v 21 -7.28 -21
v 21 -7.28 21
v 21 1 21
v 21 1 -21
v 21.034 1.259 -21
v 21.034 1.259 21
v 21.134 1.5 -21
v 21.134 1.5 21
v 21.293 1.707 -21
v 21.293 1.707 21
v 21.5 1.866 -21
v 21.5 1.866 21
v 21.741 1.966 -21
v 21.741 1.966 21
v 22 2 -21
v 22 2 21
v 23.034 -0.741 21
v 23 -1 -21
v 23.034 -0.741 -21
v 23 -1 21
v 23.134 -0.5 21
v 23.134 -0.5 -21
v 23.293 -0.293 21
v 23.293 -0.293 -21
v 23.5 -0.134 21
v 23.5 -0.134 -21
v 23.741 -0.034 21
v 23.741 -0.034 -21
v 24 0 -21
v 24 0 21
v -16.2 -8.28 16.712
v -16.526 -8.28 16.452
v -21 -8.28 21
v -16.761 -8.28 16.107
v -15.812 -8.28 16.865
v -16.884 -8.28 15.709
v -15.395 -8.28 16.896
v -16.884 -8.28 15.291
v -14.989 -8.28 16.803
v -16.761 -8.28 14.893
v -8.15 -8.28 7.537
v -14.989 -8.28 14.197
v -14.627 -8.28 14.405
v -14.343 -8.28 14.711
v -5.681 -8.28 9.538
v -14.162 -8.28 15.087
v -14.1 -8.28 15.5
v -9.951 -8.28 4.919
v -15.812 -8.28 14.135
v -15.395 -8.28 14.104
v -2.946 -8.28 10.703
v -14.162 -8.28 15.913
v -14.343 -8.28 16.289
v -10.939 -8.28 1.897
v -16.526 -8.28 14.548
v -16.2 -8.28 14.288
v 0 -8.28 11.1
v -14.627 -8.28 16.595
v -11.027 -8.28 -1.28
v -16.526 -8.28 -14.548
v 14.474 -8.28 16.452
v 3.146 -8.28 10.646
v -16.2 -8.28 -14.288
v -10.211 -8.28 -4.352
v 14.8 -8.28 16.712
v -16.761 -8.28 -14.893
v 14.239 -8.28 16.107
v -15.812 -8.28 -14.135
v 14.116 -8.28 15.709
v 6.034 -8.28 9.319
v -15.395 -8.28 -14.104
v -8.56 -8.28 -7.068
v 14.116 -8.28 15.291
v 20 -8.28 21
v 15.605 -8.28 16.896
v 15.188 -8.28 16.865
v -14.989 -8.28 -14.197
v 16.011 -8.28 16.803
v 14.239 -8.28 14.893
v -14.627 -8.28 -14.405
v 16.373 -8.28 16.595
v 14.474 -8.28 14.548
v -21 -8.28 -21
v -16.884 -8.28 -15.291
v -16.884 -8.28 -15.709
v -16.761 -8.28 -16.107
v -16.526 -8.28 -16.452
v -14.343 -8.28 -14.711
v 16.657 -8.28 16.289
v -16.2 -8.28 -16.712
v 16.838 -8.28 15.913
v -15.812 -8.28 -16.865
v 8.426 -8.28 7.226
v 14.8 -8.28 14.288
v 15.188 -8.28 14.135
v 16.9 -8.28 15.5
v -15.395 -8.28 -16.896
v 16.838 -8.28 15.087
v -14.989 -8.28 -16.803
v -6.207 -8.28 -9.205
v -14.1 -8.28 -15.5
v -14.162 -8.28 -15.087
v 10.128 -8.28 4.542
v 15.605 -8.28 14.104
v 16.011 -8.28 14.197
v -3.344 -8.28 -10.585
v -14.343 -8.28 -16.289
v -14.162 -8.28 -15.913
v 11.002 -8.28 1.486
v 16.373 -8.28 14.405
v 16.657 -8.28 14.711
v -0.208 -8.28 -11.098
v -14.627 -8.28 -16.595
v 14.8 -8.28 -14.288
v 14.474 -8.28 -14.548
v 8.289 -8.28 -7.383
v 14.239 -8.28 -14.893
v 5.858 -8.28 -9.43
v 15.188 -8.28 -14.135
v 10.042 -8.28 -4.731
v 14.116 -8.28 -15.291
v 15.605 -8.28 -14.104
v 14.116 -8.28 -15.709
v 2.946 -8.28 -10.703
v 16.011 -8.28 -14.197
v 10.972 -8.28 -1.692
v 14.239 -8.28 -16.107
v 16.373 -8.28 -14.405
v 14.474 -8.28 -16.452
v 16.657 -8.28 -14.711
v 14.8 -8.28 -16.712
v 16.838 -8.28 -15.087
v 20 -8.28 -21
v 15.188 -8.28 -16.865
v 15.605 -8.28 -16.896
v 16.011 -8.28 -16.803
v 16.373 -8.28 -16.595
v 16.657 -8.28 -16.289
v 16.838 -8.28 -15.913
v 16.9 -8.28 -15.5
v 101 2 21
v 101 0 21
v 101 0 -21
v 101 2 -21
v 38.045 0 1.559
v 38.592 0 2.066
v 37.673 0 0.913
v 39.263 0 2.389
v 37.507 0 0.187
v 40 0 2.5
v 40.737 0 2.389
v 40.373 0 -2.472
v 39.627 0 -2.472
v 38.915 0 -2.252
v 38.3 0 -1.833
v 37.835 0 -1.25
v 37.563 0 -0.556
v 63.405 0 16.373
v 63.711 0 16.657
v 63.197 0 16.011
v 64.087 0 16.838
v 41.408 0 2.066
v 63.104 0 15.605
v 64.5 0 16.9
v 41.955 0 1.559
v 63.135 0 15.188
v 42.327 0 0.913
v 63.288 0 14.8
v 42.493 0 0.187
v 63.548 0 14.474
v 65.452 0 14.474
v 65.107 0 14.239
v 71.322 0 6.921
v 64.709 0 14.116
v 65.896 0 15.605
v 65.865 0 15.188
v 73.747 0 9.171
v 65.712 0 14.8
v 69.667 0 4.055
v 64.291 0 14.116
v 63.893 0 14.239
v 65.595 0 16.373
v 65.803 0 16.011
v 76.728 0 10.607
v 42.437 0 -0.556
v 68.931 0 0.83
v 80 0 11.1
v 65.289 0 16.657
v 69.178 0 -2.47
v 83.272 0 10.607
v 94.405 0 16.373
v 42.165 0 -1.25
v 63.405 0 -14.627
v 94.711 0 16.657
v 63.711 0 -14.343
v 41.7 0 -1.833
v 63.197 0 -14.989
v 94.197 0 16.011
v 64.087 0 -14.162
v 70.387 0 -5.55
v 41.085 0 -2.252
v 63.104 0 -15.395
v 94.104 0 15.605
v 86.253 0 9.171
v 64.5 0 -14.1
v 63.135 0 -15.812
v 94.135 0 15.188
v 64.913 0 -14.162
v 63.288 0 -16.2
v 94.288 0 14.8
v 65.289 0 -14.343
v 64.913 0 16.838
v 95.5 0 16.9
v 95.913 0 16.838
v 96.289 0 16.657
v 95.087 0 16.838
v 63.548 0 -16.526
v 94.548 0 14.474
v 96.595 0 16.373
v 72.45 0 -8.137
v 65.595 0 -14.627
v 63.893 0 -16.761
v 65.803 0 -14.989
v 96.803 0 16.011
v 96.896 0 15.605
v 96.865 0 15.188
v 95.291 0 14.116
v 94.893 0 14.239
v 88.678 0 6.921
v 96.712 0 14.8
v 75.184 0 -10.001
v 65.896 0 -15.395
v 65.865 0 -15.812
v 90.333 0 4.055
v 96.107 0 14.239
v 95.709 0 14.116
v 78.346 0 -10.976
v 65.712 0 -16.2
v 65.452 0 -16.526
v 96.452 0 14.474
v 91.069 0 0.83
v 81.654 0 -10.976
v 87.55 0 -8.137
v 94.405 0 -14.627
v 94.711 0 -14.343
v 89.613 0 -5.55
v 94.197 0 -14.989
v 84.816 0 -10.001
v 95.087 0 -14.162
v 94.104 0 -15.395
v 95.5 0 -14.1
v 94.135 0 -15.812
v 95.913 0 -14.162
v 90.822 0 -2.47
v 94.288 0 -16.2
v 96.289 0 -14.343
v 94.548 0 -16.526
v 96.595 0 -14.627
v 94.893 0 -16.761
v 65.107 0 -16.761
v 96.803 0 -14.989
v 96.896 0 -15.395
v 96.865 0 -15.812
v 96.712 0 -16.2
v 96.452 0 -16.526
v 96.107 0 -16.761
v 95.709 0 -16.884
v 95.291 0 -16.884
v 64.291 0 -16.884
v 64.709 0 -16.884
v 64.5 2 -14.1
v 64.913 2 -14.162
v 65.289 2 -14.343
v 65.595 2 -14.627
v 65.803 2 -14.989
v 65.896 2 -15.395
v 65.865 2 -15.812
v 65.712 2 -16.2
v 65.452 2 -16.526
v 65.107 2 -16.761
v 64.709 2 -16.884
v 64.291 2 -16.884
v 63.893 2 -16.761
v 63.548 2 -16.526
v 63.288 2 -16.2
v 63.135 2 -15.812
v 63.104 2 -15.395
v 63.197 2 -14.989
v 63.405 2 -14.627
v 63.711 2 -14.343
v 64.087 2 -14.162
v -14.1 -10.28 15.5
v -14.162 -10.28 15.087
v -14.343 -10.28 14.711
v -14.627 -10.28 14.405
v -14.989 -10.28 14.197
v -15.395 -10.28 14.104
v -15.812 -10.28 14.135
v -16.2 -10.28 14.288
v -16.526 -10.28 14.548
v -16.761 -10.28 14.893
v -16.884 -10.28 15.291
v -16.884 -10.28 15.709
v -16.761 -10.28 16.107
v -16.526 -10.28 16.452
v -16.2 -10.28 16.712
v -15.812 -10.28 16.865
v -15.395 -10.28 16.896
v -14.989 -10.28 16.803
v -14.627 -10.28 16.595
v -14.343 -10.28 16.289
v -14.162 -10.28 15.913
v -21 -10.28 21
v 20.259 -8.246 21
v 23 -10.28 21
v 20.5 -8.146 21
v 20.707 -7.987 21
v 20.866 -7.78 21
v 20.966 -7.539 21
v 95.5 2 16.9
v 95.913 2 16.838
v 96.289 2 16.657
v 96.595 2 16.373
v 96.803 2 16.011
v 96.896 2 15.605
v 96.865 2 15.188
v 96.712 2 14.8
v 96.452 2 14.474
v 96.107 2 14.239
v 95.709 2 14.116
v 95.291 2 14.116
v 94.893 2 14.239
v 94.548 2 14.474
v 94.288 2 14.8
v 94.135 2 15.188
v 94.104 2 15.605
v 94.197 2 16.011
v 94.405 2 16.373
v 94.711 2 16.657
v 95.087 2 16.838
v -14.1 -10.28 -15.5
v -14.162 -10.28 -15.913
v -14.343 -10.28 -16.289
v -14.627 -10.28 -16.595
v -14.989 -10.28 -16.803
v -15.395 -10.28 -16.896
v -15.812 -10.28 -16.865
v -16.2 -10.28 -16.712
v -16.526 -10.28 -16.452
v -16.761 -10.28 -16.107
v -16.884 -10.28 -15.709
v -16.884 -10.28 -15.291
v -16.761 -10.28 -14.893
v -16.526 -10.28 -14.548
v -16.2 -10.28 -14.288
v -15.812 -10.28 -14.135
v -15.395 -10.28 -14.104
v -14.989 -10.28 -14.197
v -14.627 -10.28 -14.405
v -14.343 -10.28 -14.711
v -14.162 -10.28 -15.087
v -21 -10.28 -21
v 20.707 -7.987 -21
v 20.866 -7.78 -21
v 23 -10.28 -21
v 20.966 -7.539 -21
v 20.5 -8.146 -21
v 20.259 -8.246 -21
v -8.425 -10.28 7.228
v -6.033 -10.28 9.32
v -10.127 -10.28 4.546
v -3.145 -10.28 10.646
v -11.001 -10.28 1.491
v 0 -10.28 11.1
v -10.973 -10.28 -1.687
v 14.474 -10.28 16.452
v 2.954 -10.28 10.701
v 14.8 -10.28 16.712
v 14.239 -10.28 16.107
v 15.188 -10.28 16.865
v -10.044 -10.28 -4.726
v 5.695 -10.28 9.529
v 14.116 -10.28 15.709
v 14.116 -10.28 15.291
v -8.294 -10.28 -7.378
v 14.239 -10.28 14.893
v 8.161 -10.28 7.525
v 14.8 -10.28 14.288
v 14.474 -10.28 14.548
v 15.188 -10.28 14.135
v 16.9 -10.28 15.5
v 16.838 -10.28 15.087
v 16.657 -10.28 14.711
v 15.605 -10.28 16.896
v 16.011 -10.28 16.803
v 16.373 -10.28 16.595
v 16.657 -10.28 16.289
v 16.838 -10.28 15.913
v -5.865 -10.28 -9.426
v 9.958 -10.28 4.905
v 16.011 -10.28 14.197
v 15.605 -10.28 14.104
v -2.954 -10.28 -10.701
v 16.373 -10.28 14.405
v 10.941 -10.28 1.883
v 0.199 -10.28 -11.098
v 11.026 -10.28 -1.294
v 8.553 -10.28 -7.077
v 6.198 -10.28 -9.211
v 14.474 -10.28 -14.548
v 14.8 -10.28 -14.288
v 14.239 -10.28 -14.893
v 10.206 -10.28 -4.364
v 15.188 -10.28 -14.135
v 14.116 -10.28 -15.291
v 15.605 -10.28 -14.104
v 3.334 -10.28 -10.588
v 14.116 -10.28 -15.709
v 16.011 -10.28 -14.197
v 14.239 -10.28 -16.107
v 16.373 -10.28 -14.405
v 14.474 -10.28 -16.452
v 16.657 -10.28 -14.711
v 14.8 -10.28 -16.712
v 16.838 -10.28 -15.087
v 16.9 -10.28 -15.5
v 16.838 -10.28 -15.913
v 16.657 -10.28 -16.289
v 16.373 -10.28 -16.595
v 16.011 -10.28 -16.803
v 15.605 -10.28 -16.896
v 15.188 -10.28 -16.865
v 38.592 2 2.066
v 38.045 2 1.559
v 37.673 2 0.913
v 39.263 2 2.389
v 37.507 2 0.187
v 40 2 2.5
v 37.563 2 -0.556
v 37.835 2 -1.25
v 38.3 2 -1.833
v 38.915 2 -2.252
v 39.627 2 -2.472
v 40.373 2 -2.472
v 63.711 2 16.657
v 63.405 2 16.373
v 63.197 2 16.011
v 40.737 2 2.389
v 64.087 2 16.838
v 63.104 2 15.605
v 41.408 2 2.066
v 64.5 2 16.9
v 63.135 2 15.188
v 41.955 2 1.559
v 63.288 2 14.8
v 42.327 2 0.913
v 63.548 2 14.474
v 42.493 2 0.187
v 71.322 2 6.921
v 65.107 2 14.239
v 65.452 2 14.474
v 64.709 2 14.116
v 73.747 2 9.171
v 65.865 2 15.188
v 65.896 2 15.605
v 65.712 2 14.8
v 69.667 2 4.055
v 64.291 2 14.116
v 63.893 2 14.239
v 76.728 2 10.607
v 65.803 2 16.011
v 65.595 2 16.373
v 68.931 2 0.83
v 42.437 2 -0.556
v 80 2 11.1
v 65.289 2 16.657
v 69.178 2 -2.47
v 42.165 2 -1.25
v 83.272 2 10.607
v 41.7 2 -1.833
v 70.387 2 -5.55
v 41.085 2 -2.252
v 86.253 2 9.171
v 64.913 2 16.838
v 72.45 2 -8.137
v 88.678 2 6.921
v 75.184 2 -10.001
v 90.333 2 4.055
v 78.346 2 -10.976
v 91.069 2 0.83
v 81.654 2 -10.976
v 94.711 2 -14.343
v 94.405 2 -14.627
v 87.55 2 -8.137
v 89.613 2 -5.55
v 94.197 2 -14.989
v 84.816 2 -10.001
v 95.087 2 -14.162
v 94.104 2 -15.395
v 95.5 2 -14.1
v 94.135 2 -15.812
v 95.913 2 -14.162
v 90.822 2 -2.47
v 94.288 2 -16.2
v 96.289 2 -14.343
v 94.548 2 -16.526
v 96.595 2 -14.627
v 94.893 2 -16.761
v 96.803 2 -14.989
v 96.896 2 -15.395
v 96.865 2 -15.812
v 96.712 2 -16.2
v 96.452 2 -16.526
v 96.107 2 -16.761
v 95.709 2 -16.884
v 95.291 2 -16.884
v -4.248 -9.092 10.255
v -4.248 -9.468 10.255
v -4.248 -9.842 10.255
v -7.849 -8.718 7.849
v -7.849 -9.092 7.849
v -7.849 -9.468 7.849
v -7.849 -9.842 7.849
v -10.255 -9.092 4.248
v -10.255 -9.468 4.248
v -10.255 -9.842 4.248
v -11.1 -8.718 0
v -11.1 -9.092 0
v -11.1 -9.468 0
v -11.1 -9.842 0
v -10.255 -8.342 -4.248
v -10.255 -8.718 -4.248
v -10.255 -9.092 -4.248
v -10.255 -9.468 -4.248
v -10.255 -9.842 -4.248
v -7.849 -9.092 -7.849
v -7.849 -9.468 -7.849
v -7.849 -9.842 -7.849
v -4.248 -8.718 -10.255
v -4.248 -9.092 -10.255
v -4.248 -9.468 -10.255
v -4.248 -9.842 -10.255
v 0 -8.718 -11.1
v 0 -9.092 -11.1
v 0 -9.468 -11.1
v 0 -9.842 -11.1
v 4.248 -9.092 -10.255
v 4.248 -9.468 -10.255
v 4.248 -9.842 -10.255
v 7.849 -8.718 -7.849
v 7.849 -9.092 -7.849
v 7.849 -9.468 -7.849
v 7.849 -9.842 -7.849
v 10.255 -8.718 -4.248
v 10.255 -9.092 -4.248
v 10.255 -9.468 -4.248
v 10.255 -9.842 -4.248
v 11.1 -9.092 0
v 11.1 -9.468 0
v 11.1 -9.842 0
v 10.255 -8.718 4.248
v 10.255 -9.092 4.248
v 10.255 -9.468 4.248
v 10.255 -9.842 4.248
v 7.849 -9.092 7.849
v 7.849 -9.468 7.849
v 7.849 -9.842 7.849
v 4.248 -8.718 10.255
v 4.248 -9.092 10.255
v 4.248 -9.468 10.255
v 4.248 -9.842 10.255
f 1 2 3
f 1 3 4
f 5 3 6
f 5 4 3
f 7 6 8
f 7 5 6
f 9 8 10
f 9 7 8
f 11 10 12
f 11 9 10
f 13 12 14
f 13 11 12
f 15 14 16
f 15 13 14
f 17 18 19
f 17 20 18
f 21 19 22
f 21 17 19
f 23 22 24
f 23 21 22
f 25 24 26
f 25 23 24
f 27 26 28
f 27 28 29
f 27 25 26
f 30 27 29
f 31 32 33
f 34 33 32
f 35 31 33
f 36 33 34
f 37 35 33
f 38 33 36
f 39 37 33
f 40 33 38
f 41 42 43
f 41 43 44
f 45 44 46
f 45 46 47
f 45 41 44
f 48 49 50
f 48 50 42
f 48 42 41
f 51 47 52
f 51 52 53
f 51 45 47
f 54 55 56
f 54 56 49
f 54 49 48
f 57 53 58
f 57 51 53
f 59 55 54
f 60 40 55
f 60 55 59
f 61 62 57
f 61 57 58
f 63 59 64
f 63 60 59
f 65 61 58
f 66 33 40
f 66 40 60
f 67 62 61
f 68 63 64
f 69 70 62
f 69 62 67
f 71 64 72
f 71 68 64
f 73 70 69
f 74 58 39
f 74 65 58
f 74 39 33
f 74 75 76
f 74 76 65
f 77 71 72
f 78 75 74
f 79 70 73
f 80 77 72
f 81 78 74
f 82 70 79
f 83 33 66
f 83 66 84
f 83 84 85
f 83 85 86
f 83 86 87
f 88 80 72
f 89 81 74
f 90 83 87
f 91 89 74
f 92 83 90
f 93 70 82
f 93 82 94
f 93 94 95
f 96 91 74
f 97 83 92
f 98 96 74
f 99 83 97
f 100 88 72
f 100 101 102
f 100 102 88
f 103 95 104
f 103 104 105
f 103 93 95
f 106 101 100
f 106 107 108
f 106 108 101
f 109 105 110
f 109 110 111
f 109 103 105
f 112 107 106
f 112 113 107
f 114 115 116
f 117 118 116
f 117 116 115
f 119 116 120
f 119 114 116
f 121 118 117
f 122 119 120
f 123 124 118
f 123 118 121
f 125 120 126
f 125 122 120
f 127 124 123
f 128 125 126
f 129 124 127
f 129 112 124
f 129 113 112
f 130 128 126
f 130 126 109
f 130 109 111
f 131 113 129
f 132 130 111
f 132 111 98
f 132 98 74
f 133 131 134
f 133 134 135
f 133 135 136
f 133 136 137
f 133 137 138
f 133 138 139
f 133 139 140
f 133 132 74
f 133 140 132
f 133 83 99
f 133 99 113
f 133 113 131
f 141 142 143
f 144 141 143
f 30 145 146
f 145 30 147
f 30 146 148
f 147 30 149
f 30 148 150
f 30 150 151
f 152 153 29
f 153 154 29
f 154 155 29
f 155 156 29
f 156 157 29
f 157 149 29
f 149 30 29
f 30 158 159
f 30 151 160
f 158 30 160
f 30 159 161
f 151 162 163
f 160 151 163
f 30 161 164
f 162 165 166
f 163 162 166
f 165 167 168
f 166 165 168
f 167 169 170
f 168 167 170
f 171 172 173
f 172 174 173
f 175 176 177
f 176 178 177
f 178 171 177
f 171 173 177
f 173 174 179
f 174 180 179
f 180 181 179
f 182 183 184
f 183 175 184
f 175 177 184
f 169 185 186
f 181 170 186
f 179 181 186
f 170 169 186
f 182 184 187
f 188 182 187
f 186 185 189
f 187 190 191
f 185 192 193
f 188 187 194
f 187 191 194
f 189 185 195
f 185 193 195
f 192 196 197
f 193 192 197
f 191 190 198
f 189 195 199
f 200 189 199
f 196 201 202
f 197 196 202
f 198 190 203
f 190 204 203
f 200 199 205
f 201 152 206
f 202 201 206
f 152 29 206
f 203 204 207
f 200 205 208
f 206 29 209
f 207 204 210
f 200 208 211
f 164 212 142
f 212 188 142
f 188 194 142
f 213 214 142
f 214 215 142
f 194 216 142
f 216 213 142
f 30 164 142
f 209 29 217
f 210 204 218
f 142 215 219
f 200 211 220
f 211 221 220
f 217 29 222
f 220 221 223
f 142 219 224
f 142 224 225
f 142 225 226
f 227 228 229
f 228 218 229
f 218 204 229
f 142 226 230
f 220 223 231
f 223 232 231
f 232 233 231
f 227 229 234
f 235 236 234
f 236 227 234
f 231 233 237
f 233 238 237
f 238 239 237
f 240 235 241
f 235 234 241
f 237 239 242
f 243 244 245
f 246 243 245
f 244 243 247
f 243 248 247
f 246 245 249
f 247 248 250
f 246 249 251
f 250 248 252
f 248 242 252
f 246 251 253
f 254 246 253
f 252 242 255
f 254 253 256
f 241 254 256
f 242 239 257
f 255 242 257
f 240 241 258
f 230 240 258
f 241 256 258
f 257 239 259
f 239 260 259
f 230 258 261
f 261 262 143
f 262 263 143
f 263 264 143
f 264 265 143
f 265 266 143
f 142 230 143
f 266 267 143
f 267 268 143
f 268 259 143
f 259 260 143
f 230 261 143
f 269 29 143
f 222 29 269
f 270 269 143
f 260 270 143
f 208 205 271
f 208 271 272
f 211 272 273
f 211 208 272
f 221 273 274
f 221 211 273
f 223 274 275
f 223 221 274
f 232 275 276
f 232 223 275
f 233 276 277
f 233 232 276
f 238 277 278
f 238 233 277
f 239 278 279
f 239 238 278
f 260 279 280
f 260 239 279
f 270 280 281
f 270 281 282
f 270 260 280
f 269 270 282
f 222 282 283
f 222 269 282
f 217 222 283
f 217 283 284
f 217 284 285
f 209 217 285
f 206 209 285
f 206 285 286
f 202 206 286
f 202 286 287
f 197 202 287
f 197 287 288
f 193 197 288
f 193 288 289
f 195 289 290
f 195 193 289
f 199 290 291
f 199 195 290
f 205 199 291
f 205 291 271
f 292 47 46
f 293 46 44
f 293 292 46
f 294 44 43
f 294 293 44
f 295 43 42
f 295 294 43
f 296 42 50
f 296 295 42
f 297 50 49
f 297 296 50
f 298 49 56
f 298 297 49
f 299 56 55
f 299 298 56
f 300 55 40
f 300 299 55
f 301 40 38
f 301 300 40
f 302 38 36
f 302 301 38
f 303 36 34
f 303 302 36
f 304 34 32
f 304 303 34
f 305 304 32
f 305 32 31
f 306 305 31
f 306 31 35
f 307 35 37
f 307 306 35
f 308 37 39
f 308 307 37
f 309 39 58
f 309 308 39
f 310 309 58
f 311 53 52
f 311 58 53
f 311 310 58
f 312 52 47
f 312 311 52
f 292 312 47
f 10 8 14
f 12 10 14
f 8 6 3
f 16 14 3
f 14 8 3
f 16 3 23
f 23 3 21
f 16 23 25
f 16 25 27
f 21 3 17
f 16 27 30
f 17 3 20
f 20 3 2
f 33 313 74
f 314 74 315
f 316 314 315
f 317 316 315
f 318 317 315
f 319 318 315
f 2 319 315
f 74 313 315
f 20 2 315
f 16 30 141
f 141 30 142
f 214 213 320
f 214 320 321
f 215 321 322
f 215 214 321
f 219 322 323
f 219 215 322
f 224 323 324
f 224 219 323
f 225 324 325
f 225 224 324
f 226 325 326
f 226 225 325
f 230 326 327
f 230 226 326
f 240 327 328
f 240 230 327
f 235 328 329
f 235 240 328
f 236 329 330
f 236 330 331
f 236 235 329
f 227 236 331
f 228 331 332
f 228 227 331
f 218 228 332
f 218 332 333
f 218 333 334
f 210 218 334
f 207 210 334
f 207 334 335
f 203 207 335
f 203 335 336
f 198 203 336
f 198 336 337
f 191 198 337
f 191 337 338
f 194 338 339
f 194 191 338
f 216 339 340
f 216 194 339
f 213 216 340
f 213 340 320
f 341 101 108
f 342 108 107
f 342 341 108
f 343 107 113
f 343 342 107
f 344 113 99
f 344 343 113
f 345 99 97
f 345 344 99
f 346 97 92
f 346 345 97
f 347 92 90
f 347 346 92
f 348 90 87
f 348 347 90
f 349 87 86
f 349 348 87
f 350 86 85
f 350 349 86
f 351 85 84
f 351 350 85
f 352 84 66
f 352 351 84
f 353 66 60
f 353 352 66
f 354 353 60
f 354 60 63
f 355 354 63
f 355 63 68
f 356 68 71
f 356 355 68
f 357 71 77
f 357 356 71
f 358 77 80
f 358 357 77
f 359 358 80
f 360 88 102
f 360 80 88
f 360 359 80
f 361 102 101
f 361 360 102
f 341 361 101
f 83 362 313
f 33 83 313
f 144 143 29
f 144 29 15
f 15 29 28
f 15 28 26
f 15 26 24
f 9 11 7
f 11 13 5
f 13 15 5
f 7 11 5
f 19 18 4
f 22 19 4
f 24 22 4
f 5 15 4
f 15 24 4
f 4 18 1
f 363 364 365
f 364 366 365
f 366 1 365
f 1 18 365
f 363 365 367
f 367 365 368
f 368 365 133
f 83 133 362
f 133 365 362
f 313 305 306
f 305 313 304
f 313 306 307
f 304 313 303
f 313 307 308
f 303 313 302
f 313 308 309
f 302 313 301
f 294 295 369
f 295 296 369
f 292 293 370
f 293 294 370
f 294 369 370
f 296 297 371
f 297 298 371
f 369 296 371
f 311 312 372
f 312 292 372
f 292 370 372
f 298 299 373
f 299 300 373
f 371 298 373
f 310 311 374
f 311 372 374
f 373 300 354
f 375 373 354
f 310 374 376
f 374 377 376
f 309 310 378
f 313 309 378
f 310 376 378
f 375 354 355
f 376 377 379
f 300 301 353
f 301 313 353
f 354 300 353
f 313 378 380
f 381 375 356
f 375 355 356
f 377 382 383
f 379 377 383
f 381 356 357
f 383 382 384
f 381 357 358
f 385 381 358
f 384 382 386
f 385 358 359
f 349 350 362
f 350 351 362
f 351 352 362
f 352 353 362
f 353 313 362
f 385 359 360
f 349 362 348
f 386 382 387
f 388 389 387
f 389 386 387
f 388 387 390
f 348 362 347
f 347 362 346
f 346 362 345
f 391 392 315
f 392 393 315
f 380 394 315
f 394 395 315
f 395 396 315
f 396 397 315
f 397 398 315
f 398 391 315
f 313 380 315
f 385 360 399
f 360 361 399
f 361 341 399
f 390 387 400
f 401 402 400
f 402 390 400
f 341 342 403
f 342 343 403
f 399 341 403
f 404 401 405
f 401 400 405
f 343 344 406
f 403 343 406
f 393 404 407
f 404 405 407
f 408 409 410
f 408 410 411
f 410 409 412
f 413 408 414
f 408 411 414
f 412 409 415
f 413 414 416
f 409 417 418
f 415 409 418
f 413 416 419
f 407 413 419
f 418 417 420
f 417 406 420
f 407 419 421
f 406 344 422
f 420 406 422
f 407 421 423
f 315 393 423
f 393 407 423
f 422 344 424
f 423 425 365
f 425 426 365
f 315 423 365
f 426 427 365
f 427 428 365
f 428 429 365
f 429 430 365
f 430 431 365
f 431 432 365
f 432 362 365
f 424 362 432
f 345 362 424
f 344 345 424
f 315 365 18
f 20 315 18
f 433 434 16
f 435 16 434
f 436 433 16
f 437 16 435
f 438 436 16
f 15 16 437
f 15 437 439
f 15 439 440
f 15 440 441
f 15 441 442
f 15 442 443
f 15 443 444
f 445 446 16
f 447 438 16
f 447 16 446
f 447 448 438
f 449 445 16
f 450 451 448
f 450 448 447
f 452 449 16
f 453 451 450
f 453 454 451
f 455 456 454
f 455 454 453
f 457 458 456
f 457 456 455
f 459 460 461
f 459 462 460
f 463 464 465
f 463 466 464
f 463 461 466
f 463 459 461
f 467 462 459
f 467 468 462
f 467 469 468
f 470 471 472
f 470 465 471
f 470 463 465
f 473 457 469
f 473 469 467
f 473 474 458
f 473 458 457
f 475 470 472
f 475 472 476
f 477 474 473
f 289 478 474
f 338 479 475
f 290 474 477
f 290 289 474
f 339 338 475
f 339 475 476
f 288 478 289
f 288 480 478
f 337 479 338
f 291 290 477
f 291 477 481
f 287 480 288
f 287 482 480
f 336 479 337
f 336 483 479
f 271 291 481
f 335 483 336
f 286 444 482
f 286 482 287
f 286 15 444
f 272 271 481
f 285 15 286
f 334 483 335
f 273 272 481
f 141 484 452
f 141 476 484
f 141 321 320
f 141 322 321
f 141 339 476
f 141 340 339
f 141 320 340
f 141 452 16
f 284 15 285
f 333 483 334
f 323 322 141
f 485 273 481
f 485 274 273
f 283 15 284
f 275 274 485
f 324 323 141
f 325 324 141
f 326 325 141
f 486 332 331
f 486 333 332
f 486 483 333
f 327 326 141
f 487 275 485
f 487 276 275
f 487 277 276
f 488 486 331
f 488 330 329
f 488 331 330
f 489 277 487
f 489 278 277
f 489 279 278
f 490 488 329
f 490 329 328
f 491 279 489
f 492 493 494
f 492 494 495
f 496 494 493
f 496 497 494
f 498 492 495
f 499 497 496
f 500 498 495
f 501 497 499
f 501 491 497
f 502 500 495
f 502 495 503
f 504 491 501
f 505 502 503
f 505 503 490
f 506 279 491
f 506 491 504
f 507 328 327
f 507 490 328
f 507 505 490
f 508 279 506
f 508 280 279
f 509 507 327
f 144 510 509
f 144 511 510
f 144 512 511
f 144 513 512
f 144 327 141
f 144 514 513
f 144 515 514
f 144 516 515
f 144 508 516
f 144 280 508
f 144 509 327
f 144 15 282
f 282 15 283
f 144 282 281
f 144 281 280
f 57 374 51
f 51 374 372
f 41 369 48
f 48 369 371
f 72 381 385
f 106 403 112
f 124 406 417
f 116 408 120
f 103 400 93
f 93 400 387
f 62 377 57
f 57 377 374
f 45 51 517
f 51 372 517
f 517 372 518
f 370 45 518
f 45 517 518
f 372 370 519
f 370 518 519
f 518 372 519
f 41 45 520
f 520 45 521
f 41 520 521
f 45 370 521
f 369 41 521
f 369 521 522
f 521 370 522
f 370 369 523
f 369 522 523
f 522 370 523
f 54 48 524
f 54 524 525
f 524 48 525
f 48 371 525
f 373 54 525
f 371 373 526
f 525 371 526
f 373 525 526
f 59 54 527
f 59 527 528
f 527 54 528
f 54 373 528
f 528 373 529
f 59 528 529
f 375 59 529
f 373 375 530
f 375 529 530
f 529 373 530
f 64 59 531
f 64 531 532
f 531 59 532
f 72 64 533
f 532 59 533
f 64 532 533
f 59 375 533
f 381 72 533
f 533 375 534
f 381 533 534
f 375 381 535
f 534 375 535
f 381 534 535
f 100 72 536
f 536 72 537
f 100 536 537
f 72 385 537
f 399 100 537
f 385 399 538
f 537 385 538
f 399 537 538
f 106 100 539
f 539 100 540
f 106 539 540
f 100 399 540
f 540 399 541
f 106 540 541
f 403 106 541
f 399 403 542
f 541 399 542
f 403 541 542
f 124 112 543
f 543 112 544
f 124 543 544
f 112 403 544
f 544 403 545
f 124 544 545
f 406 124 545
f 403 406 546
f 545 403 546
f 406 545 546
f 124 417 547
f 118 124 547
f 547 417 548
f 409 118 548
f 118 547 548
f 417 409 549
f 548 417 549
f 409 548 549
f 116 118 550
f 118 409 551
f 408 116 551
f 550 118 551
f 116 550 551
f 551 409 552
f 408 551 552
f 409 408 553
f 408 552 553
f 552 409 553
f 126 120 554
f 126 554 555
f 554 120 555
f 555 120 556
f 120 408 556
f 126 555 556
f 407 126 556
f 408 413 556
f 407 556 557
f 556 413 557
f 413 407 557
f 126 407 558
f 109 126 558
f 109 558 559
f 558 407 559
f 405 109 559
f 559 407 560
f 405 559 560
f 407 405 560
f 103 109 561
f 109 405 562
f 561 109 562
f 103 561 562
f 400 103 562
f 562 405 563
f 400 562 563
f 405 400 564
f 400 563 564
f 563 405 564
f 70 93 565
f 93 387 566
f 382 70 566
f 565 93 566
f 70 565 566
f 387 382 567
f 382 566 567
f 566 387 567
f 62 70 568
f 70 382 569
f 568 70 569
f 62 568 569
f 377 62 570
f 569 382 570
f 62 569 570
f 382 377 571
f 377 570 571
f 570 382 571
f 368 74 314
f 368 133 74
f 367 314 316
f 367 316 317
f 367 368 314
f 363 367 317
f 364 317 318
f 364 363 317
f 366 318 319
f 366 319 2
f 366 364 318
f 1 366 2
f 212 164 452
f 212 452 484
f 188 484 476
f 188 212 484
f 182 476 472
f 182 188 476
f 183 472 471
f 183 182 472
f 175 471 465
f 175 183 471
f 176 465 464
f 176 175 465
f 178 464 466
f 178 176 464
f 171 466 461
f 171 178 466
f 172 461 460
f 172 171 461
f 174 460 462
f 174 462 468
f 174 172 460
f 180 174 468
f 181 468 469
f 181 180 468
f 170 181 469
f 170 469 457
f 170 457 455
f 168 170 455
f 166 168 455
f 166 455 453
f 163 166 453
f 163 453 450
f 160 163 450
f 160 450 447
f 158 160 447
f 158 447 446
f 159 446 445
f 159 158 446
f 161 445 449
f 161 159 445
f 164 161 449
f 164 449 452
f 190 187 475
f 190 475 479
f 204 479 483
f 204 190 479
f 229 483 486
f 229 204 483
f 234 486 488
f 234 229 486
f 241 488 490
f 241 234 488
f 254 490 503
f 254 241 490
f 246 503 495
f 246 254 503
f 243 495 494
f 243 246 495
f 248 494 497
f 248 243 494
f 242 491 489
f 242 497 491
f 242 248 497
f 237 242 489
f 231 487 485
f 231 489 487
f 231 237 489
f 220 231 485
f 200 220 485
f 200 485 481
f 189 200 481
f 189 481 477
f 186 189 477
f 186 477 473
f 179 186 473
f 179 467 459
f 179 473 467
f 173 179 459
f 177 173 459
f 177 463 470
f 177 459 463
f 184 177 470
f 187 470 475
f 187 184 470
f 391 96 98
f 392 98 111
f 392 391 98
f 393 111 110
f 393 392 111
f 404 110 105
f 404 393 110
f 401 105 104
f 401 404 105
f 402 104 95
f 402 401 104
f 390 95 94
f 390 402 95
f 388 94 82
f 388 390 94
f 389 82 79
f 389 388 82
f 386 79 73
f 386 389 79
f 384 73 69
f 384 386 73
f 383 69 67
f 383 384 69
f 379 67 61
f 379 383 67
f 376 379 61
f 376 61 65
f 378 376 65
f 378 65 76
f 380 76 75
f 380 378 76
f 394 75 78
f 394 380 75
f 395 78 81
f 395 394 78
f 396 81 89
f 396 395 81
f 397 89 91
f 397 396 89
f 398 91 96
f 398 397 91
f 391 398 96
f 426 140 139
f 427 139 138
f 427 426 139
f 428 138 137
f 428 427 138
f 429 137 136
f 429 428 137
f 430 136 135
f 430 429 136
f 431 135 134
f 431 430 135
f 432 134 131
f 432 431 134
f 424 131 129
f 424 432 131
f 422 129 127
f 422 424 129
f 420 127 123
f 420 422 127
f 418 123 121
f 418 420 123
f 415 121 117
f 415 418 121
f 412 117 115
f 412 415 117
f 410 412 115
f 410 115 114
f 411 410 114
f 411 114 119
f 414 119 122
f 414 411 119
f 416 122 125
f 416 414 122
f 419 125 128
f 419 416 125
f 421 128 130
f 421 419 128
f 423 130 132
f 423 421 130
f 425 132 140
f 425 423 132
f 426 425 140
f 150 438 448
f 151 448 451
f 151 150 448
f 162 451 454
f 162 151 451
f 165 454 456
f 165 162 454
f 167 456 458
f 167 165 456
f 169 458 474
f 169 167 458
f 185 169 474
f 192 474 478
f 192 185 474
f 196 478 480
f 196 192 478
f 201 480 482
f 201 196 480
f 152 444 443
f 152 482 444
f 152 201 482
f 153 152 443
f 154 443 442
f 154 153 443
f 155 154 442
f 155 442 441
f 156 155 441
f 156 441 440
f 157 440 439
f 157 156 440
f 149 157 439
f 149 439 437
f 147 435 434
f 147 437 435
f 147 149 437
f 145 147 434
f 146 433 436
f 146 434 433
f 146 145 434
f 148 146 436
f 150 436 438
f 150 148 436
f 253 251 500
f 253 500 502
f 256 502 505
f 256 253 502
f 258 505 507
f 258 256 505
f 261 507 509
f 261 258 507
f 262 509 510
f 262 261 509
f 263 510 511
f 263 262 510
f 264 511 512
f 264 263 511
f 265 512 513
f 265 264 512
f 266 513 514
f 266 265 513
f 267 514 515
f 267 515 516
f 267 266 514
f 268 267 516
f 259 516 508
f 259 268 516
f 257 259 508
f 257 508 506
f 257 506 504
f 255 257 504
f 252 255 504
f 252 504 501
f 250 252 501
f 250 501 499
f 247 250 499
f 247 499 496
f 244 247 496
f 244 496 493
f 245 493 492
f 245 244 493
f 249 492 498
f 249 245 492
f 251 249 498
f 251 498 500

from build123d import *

# Parameters (mm, degrees)
SKETCH1_W               = 38
SKETCH1_H               = 21
SKETCH1_R               = 1.4
BOSS_EXTRUDE1_DEPTH     = 2
CUT_EXTRUDE1_DEPTH      = 104.179455
CUT_EXTRUDE1_DEPTH_BACK = 104.179455
SKETCH3_R               = 11.1
CUT_EXTRUDE2_DEPTH      = 104.179455
CUT_EXTRUDE2_DEPTH_BACK = 104.179455
SKETCH4_R               = 2.5
BOSS_EXTRUDE2_START     = -12.28
BOSS_EXTRUDE2_OUTLINE_R = 1.4
BOSS_EXTRUDE2_DEPTH     = 10.28
CUT_EXTRUDE3_START      = -10.28
SKETCH6_W               = 42
SKETCH6_H               = 42
SKETCH6_R               = 1.4
CUT_EXTRUDE3_DEPTH      = 10.28
CUT_EXTRUDE4_DEPTH      = 110.866639
CUT_EXTRUDE4_DEPTH_BACK = 110.866639
SKETCH7_W               = 17
SKETCH7_H               = 10.28
FILLET1_R               = 1


# Read off the part's stored shape, not the designer's step: Boss-Extrude2
with BuildPart() as part:
    # Sketch1 → Boss-Extrude1 (new body)
    # profile 1 of 4: a face of its own
    with BuildSketch(Plane(origin=(0, 0, 0), x_dir=(1, 0, 0), z_dir=(0, 1, 0))):
        with Locations((40, 10.5)):
            Rectangle(SKETCH1_W, SKETCH1_H)
    # profile 2 of 4: a face of its own
    with BuildSketch(Plane(origin=(0, 0, 0), x_dir=(1, 0, 0), z_dir=(0, 1, 0))):
        Polygon((21, -21), (21, 0), (21, 21), (-21, 21), (-21, -21), align=None)
        with Locations(Location((-15.5, -15.5, 0), (0, 0, 270))):
            Circle(SKETCH1_R, mode=Mode.SUBTRACT)
        with Locations(Location((15.5, -15.5, 0), (0, 0, 270))):
            Circle(SKETCH1_R, mode=Mode.SUBTRACT)
        with Locations(Location((-15.5, 15.5, 0), (0, 0, 270))):
            Circle(SKETCH1_R, mode=Mode.SUBTRACT)
        with Locations(Location((15.5, 15.5, 0), (0, 0, 270))):
            Circle(SKETCH1_R, mode=Mode.SUBTRACT)
    # profile 3 of 4: a face of its own
    with BuildSketch(Plane(origin=(0, 0, 0), x_dir=(1, 0, 0), z_dir=(0, 1, 0))):
        with Locations((40, -10.5)):
            Rectangle(SKETCH1_W, SKETCH1_H)
    # profile 4 of 4: a face of its own
    with BuildSketch(Plane(origin=(0, 0, 0), x_dir=(1, 0, 0), z_dir=(0, 1, 0))):
        Polygon((59, 21), (59, 0), (59, -21), (101, -21), (101, 21), align=None)
        with Locations(Location((64.5, -15.5, 0), (0, 0, 270))):
            Circle(SKETCH1_R, mode=Mode.SUBTRACT)
        with Locations(Location((95.5, -15.5, 0), (0, 0, 270))):
            Circle(SKETCH1_R, mode=Mode.SUBTRACT)
        with Locations(Location((64.5, 15.5, 0), (0, 0, 270))):
            Circle(SKETCH1_R, mode=Mode.SUBTRACT)
        with Locations(Location((95.5, 15.5, 0), (0, 0, 270))):
            Circle(SKETCH1_R, mode=Mode.SUBTRACT)
    extrude(amount=BOSS_EXTRUDE1_DEPTH)

    # Sketch3 → Cut-Extrude1 (cut, two sides: drawn at the far end of the back side and taken through both)
    with BuildSketch(Plane(origin=(0, 2, 0), x_dir=(1, 0, 0), z_dir=(0, 1, 0)).offset(-CUT_EXTRUDE1_DEPTH_BACK)):
        with Locations(Location((80, 0, 0), (0, 0, 270))):
            Circle(SKETCH3_R)
        with Locations(Location((0, 0, 0), (0, 0, 270))):
            Circle(SKETCH3_R)
    extrude(amount=CUT_EXTRUDE1_DEPTH + CUT_EXTRUDE1_DEPTH_BACK, mode=Mode.SUBTRACT)

    # Sketch4 → Cut-Extrude2 (cut, two sides: drawn at the far end of the back side and taken through both)
    with BuildSketch(Plane(origin=(0, 2, 0), x_dir=(1, 0, 0), z_dir=(0, 1, 0)).offset(-CUT_EXTRUDE2_DEPTH_BACK)):
        with Locations(Location((40, 0, 0), (0, 0, 270))):
            Circle(SKETCH4_R)
    extrude(amount=CUT_EXTRUDE2_DEPTH + CUT_EXTRUDE2_DEPTH_BACK, mode=Mode.SUBTRACT)


with BuildPart() as boss_extrude2_tool:
    # Boss-Extrude2 outline → Boss-Extrude2 (new body)
    with BuildSketch(Plane(origin=(0, 2, 0), x_dir=(1, 0, 0), z_dir=(0, 1, 0)).offset(BOSS_EXTRUDE2_START)):
        with BuildLine():
            Line((-21, -21), (40, -21))
            Line((40, -21), (40, -2.5))
            ThreePointArc((40, -2.5), (37.5, 0), (40, 2.5))
            Line((40, 2.5), (40, 21))
            Line((40, 21), (-21, 21))
            Line((-21, 21), (-21, -21))
        make_face()
        with Locations((-15.5, -15.5)):
            Circle(BOSS_EXTRUDE2_OUTLINE_R, mode=Mode.SUBTRACT)
        with Locations((15.5, -15.5)):
            Circle(BOSS_EXTRUDE2_OUTLINE_R, mode=Mode.SUBTRACT)
        with BuildLine():
            add(Edge.make_bspline(
                [(0, -11.1), (-0.726845, -11.100027), (-2.180374, -10.961006), (-4.27463, -10.319187), (-6.209027, -9.292142), (-7.898295, -7.897803), (-9.292338, -6.208724), (-10.319432, -4.274073), (-10.960977, -2.180089), (-11.169529, 0.000347), (-10.960906, 2.180445), (-10.319167, 4.274715), (-9.292137, 6.209025), (-7.897804, 7.898295), (-6.208724, 9.292338), (-4.274073, 10.319432), (-2.180089, 10.960977), (0.000347, 11.169529), (2.180445, 10.960906), (4.274715, 10.319167), (6.209025, 9.292137), (7.898295, 7.897804), (9.292338, 6.208724), (10.319432, 4.274073), (10.960977, 2.180089), (11.169529, -0.000347), (10.960906, -2.180445), (10.319167, -4.274715), (9.292137, -6.209025), (7.897805, -7.898297), (6.208722, -9.292332), (4.274158, -10.319412), (2.180159, -10.960877), (0.726667, -11.099973), (0, -11.1)],
                knots=[0, 0, 0, 0, 0.031254, 0.0625, 0.093758, 0.125, 0.156258, 0.1875, 0.218758, 0.25, 0.281258, 0.3125, 0.343758, 0.375, 0.406258, 0.4375, 0.468758, 0.5, 0.531258, 0.5625, 0.593758, 0.625, 0.656258, 0.6875, 0.718758, 0.75, 0.781258, 0.8125, 0.843758, 0.875, 0.906258, 0.9375, 0.968754, 1, 1, 1, 1], degree=3))
        make_face(mode=Mode.SUBTRACT)
        with Locations((-15.5, 15.5)):
            Circle(BOSS_EXTRUDE2_OUTLINE_R, mode=Mode.SUBTRACT)
        with Locations((15.5, 15.5)):
            Circle(BOSS_EXTRUDE2_OUTLINE_R, mode=Mode.SUBTRACT)
    extrude(amount=BOSS_EXTRUDE2_DEPTH)


with BuildPart() as part_1:
    add(part.part)


with BuildPart() as part_2:
    # Boss-Extrude2: joined with boss_extrude2_tool
    add(part_1.part.fuse(boss_extrude2_tool.part, tol=0.00001))

    # Sketch6 → Cut-Extrude3 (cut)
    with BuildSketch(Plane(origin=(0, 2, 0), x_dir=(1, 0, 0), z_dir=(0, 1, 0)).offset(CUT_EXTRUDE3_START)):
        Rectangle(SKETCH6_W, SKETCH6_H)
        with Locations(Location((15.5, 15.5, 0), (0, 0, 270))):
            Circle(SKETCH6_R, mode=Mode.SUBTRACT)
        with Locations(Location((-15.5, 15.5, 0), (0, 0, 270))):
            Circle(SKETCH6_R, mode=Mode.SUBTRACT)
        with Locations(Location((-15.5, -15.5, 0), (0, 0, 270))):
            Circle(SKETCH6_R, mode=Mode.SUBTRACT)
        with Locations(Location((15.5, -15.5, 0), (0, 0, 270))):
            Circle(SKETCH6_R, mode=Mode.SUBTRACT)
    extrude(amount=CUT_EXTRUDE3_DEPTH, mode=Mode.SUBTRACT)

    # Sketch7 → Cut-Extrude4 (cut, two sides: drawn at the far end of the back side and taken through both)
    with BuildSketch(Plane.XY.offset(21).offset(-CUT_EXTRUDE4_DEPTH_BACK)):
        with Locations((31.5, -5.14)):
            Rectangle(SKETCH7_W, SKETCH7_H)
    extrude(amount=CUT_EXTRUDE4_DEPTH + CUT_EXTRUDE4_DEPTH_BACK, mode=Mode.SUBTRACT)

    # Fillet1
    fillet1_edges = [part_2.edges().sort_by_distance(p)[0] for p in [
        (21, -8.28, 0),
        (21, 2, 0),
        (23, 0, 0),
    ]]
    fillet(fillet1_edges, radius=FILLET1_R)


solid = part_2.part
